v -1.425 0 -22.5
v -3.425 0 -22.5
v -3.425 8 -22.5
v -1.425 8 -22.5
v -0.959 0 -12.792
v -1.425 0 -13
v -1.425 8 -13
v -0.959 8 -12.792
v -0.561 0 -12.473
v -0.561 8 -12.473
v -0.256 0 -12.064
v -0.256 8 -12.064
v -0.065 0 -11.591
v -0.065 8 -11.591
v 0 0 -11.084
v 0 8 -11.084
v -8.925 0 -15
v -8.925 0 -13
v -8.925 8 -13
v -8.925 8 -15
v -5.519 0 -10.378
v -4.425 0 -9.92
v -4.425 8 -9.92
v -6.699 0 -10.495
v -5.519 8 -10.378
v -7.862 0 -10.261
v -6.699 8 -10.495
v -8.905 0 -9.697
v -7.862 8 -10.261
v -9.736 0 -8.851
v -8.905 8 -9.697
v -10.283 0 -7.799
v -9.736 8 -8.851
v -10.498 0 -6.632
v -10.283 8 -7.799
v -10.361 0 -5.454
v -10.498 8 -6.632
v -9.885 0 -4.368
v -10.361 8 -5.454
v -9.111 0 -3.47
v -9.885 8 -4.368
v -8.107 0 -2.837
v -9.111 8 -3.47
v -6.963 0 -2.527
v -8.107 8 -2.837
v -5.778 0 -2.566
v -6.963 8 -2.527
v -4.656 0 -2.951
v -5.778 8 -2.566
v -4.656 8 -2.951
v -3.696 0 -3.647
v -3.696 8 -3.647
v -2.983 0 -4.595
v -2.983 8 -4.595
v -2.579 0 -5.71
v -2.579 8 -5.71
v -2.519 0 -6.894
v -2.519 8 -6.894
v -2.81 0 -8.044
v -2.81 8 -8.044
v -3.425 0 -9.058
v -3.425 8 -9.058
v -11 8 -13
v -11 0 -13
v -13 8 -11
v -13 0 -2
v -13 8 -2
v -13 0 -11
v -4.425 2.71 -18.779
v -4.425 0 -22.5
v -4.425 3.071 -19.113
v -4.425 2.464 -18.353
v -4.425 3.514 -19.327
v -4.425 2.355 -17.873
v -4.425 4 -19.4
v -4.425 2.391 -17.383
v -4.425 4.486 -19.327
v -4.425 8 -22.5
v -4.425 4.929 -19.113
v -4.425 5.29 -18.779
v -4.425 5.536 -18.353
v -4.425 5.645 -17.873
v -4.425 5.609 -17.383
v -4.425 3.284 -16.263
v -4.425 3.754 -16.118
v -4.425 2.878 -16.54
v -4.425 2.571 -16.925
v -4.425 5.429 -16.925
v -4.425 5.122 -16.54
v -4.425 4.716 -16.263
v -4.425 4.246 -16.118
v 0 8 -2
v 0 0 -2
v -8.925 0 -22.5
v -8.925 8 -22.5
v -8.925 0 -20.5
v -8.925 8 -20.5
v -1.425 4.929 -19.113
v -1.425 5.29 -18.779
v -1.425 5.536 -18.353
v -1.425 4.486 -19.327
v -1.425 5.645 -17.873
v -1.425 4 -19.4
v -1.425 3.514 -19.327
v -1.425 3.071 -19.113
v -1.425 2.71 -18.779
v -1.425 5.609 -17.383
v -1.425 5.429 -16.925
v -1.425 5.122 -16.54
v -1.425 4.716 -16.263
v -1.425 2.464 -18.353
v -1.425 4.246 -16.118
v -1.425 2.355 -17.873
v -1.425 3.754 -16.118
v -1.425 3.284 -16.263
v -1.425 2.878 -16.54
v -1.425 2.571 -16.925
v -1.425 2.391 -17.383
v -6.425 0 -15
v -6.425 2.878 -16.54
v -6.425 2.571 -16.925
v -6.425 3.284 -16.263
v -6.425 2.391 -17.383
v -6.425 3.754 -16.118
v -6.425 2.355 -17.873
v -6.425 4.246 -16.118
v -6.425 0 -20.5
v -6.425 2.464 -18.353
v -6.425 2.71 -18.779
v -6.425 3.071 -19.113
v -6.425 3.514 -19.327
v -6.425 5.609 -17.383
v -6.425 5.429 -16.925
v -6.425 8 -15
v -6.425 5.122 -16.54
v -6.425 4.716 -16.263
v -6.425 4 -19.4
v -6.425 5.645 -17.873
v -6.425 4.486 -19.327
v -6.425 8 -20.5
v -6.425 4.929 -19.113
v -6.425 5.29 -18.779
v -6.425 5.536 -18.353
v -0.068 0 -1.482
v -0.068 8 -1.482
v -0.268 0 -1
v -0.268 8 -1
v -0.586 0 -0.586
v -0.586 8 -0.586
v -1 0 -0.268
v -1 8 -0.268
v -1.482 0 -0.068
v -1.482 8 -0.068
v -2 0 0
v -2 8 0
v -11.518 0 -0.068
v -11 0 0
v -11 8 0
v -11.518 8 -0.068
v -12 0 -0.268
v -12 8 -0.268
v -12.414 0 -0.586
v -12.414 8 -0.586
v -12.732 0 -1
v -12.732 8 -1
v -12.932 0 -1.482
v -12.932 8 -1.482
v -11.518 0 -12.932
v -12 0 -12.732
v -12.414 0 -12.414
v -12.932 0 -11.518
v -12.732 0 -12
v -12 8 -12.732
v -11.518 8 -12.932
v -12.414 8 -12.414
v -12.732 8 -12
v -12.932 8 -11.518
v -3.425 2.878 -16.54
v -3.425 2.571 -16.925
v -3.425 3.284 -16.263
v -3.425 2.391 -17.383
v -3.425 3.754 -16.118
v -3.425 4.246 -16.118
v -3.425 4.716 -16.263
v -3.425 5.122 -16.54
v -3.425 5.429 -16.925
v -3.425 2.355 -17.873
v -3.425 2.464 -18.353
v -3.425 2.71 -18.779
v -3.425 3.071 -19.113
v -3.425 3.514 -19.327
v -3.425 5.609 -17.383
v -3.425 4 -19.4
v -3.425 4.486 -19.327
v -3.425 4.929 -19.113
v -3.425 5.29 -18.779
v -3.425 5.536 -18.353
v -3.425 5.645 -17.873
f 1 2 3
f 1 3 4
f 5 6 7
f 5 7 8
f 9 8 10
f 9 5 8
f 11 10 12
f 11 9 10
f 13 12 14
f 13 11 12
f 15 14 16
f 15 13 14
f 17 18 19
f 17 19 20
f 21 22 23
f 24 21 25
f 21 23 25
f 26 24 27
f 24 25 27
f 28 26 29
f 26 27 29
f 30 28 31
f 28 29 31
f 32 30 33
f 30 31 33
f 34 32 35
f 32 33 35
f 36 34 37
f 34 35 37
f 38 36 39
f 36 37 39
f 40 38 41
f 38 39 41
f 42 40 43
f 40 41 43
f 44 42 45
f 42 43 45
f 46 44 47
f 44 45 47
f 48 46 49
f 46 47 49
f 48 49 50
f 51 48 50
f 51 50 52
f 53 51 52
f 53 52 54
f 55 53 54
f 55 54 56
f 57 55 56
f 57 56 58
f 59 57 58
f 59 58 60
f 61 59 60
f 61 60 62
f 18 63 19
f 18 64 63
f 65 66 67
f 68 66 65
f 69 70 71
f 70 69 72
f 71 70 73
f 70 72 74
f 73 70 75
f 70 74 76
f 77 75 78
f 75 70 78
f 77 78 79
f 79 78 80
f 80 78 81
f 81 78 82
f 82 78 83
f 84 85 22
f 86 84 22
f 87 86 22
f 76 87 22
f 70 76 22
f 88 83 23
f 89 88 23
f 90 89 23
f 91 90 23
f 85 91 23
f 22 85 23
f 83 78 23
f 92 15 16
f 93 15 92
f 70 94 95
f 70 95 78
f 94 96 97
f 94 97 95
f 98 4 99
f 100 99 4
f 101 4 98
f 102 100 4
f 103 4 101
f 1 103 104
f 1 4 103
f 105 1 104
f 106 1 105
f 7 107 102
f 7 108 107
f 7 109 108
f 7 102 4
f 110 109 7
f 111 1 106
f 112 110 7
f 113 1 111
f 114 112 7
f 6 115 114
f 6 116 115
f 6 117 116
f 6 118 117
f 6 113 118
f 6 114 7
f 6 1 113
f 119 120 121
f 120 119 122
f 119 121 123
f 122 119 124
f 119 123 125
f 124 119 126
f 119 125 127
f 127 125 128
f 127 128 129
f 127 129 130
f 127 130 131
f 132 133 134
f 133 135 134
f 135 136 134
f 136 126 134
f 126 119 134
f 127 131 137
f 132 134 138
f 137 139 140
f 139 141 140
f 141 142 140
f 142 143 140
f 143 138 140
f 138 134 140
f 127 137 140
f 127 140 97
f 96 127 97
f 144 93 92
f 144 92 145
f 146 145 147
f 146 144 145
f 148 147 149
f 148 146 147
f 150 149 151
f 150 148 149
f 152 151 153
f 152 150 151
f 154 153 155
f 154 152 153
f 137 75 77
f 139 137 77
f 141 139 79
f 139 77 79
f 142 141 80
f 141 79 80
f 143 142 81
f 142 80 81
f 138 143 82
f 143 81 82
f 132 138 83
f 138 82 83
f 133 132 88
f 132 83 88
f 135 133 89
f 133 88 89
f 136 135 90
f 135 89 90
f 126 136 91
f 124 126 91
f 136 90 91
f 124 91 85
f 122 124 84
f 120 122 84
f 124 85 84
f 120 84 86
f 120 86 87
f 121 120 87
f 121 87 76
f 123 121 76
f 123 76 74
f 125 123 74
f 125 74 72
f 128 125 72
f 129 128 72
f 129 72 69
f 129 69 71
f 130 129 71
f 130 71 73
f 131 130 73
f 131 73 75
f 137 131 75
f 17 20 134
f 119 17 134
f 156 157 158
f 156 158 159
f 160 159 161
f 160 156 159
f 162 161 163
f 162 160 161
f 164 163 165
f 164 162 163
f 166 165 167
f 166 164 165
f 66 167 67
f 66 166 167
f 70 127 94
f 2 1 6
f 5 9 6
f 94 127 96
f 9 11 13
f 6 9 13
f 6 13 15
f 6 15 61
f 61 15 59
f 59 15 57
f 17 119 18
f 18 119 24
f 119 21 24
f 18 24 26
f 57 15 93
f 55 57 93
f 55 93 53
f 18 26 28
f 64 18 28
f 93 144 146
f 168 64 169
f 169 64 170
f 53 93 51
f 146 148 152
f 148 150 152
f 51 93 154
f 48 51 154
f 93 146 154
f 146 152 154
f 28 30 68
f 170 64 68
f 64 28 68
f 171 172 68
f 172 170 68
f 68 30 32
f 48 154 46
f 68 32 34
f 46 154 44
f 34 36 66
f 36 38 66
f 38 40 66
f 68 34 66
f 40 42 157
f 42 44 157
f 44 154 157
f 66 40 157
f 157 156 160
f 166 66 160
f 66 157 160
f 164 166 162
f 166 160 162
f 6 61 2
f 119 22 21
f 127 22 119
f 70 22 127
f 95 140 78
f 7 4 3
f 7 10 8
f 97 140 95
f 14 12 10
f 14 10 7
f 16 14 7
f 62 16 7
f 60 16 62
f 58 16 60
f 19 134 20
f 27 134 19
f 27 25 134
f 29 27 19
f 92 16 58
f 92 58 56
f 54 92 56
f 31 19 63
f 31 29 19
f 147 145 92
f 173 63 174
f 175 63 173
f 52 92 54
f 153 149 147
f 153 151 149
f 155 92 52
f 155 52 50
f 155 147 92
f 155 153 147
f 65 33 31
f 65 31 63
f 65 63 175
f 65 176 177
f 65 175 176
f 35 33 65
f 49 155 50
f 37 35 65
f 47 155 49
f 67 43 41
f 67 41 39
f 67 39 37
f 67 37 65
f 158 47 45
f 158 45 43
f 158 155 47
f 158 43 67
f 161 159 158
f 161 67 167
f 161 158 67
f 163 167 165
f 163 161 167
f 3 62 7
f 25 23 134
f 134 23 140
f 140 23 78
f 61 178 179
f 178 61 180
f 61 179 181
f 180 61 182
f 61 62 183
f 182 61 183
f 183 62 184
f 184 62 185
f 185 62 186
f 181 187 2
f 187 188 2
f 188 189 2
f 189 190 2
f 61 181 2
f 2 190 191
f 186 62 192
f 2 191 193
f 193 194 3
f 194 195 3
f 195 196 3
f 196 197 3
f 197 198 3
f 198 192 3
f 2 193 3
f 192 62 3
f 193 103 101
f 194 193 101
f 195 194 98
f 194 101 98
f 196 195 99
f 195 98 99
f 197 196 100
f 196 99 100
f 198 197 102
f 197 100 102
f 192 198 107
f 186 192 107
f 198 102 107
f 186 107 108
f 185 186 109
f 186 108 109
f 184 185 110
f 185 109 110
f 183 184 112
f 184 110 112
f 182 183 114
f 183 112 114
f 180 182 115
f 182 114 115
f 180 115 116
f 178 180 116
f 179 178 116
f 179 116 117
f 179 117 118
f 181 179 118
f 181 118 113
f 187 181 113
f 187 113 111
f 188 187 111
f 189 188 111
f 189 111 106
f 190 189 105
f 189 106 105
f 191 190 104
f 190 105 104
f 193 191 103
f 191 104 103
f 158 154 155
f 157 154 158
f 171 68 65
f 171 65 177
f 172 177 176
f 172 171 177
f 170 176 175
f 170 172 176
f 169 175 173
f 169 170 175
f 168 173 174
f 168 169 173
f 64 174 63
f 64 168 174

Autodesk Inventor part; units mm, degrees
ref_plane "YZ Plane" through (0, 0, 0) normal (1, 0, 0) x (0, 1, 0)
ref_plane "XZ Plane" through (0, 0, 0) normal (0, 1, 0) x (-1, 0, 0)
ref_plane "XY Plane" through (0, 0, 0) normal (0, 0, 1) x (1, 0, 0)
sketch "Sketch4" plane through (0, 0, 0) normal (0, 1, 0) x (-1, 0, 0)
  line L0 (0, 0) -> (13, 0)
  line L1 (13, 0) -> (13, -13)
  line L2 (13, -13) -> (8.925, -13)
  line L3 (8.925, -13) -> (8.925, -22.5)
  line L4 (8.925, -22.5) -> (1.425, -22.5)
  line L5 (1.425, -22.5) -> (1.425, -13)
  line L6 (1.425, -13) -> (0, -13)
  line L7 (0, -13) -> (0, 0)
  dimension "d17" = 13
  dimension "d18" = 13
  dimension "d19" = 7.5
  dimension "d20" = 1.425
  dimension "d21" = 9.5
extrude "Extrusion2" add sketch "Sketch4" along normal blind 8
sketch "Sketch5" plane through (0, 8, 0) normal (0, 1, 0) x (1, 0, 0)
  line L0 (-8.925, 15) -> (-6.425, 15)
  line L1 (-6.425, 15) -> (-6.425, 20.5)
  line L2 (-6.425, 20.5) -> (-8.925, 20.5)
  line L3 (-8.925, 20.5) -> (-8.925, 15)
  line L4 (-1.425, 22.5) -> (-8.925, 22.5) projected
  line L5 (-8.925, 22.5) -> (-8.925, 13) projected
  point P0 (0, 0)
  dimension "d24" = 5.5
  dimension "d25" = 2.5
  dimension "d26" = 2
extrude "Extrusion3" cut sketch "Sketch5" against normal through all
sketch "Sketch6" plane through (0, 8, 0) normal (0, 1, 0) x (1, 0, 0)
  circle A0 centre (-6.5, 6.5) radius 4
  line L0 (-13, 0) -> (0, 0) projected
  line L1 (0, 0) -> (0, 13) projected
  dimension "d29" = 8
  dimension "d30" = 6.5
  dimension "d31" = 6.5
extrude "Extrusion4" cut sketch "Sketch6" against normal through all
sketch "Sketch7" plane through (0, 8, 0) normal (0, 1, 0) x (1, 0, 0)
  line L0 (-4.425, 8.5) -> (-3.425, 8.5)
  line L1 (-3.425, 8.5) -> (-3.425, 22.5)
  line L2 (-3.425, 22.5) -> (-4.425, 22.5)
  line L3 (-4.425, 22.5) -> (-4.425, 8.5)
  line L4 (-1.425, 22.5) -> (-8.925, 22.5) projected
  line L5 (-1.425, 13) -> (-1.425, 22.5) projected
  point P0 (0, 0)
  dimension "d34" = 1
  dimension "d35" = 14
  dimension "d36" = 2
extrude "Extrusion5" cut sketch "Sketch7" against normal through all
sketch "Sketch8" plane through (-1.425, 0, -13) normal (1, 0, 0) x (0, 0, -1)
  circle A0 centre (4.75, 4) radius 1.65
  line L0 (0, 0) -> (9.5, 0) projected
  line L1 (9.5, 0) -> (9.5, 8) projected
  point P0 (-13, 0)
  dimension "d39" = 3.3
  dimension "d40" = 4
  dimension "d41" = 4.75
extrude "Extrusion6" cut sketch "Sketch8" against normal through all
fillet "Fillet1" radius 2 4 edges at (-13, 4, -13) (-13, 4, 0) (0, 4, 0) (0, 4, -13)
properties part number "COLLIER"
